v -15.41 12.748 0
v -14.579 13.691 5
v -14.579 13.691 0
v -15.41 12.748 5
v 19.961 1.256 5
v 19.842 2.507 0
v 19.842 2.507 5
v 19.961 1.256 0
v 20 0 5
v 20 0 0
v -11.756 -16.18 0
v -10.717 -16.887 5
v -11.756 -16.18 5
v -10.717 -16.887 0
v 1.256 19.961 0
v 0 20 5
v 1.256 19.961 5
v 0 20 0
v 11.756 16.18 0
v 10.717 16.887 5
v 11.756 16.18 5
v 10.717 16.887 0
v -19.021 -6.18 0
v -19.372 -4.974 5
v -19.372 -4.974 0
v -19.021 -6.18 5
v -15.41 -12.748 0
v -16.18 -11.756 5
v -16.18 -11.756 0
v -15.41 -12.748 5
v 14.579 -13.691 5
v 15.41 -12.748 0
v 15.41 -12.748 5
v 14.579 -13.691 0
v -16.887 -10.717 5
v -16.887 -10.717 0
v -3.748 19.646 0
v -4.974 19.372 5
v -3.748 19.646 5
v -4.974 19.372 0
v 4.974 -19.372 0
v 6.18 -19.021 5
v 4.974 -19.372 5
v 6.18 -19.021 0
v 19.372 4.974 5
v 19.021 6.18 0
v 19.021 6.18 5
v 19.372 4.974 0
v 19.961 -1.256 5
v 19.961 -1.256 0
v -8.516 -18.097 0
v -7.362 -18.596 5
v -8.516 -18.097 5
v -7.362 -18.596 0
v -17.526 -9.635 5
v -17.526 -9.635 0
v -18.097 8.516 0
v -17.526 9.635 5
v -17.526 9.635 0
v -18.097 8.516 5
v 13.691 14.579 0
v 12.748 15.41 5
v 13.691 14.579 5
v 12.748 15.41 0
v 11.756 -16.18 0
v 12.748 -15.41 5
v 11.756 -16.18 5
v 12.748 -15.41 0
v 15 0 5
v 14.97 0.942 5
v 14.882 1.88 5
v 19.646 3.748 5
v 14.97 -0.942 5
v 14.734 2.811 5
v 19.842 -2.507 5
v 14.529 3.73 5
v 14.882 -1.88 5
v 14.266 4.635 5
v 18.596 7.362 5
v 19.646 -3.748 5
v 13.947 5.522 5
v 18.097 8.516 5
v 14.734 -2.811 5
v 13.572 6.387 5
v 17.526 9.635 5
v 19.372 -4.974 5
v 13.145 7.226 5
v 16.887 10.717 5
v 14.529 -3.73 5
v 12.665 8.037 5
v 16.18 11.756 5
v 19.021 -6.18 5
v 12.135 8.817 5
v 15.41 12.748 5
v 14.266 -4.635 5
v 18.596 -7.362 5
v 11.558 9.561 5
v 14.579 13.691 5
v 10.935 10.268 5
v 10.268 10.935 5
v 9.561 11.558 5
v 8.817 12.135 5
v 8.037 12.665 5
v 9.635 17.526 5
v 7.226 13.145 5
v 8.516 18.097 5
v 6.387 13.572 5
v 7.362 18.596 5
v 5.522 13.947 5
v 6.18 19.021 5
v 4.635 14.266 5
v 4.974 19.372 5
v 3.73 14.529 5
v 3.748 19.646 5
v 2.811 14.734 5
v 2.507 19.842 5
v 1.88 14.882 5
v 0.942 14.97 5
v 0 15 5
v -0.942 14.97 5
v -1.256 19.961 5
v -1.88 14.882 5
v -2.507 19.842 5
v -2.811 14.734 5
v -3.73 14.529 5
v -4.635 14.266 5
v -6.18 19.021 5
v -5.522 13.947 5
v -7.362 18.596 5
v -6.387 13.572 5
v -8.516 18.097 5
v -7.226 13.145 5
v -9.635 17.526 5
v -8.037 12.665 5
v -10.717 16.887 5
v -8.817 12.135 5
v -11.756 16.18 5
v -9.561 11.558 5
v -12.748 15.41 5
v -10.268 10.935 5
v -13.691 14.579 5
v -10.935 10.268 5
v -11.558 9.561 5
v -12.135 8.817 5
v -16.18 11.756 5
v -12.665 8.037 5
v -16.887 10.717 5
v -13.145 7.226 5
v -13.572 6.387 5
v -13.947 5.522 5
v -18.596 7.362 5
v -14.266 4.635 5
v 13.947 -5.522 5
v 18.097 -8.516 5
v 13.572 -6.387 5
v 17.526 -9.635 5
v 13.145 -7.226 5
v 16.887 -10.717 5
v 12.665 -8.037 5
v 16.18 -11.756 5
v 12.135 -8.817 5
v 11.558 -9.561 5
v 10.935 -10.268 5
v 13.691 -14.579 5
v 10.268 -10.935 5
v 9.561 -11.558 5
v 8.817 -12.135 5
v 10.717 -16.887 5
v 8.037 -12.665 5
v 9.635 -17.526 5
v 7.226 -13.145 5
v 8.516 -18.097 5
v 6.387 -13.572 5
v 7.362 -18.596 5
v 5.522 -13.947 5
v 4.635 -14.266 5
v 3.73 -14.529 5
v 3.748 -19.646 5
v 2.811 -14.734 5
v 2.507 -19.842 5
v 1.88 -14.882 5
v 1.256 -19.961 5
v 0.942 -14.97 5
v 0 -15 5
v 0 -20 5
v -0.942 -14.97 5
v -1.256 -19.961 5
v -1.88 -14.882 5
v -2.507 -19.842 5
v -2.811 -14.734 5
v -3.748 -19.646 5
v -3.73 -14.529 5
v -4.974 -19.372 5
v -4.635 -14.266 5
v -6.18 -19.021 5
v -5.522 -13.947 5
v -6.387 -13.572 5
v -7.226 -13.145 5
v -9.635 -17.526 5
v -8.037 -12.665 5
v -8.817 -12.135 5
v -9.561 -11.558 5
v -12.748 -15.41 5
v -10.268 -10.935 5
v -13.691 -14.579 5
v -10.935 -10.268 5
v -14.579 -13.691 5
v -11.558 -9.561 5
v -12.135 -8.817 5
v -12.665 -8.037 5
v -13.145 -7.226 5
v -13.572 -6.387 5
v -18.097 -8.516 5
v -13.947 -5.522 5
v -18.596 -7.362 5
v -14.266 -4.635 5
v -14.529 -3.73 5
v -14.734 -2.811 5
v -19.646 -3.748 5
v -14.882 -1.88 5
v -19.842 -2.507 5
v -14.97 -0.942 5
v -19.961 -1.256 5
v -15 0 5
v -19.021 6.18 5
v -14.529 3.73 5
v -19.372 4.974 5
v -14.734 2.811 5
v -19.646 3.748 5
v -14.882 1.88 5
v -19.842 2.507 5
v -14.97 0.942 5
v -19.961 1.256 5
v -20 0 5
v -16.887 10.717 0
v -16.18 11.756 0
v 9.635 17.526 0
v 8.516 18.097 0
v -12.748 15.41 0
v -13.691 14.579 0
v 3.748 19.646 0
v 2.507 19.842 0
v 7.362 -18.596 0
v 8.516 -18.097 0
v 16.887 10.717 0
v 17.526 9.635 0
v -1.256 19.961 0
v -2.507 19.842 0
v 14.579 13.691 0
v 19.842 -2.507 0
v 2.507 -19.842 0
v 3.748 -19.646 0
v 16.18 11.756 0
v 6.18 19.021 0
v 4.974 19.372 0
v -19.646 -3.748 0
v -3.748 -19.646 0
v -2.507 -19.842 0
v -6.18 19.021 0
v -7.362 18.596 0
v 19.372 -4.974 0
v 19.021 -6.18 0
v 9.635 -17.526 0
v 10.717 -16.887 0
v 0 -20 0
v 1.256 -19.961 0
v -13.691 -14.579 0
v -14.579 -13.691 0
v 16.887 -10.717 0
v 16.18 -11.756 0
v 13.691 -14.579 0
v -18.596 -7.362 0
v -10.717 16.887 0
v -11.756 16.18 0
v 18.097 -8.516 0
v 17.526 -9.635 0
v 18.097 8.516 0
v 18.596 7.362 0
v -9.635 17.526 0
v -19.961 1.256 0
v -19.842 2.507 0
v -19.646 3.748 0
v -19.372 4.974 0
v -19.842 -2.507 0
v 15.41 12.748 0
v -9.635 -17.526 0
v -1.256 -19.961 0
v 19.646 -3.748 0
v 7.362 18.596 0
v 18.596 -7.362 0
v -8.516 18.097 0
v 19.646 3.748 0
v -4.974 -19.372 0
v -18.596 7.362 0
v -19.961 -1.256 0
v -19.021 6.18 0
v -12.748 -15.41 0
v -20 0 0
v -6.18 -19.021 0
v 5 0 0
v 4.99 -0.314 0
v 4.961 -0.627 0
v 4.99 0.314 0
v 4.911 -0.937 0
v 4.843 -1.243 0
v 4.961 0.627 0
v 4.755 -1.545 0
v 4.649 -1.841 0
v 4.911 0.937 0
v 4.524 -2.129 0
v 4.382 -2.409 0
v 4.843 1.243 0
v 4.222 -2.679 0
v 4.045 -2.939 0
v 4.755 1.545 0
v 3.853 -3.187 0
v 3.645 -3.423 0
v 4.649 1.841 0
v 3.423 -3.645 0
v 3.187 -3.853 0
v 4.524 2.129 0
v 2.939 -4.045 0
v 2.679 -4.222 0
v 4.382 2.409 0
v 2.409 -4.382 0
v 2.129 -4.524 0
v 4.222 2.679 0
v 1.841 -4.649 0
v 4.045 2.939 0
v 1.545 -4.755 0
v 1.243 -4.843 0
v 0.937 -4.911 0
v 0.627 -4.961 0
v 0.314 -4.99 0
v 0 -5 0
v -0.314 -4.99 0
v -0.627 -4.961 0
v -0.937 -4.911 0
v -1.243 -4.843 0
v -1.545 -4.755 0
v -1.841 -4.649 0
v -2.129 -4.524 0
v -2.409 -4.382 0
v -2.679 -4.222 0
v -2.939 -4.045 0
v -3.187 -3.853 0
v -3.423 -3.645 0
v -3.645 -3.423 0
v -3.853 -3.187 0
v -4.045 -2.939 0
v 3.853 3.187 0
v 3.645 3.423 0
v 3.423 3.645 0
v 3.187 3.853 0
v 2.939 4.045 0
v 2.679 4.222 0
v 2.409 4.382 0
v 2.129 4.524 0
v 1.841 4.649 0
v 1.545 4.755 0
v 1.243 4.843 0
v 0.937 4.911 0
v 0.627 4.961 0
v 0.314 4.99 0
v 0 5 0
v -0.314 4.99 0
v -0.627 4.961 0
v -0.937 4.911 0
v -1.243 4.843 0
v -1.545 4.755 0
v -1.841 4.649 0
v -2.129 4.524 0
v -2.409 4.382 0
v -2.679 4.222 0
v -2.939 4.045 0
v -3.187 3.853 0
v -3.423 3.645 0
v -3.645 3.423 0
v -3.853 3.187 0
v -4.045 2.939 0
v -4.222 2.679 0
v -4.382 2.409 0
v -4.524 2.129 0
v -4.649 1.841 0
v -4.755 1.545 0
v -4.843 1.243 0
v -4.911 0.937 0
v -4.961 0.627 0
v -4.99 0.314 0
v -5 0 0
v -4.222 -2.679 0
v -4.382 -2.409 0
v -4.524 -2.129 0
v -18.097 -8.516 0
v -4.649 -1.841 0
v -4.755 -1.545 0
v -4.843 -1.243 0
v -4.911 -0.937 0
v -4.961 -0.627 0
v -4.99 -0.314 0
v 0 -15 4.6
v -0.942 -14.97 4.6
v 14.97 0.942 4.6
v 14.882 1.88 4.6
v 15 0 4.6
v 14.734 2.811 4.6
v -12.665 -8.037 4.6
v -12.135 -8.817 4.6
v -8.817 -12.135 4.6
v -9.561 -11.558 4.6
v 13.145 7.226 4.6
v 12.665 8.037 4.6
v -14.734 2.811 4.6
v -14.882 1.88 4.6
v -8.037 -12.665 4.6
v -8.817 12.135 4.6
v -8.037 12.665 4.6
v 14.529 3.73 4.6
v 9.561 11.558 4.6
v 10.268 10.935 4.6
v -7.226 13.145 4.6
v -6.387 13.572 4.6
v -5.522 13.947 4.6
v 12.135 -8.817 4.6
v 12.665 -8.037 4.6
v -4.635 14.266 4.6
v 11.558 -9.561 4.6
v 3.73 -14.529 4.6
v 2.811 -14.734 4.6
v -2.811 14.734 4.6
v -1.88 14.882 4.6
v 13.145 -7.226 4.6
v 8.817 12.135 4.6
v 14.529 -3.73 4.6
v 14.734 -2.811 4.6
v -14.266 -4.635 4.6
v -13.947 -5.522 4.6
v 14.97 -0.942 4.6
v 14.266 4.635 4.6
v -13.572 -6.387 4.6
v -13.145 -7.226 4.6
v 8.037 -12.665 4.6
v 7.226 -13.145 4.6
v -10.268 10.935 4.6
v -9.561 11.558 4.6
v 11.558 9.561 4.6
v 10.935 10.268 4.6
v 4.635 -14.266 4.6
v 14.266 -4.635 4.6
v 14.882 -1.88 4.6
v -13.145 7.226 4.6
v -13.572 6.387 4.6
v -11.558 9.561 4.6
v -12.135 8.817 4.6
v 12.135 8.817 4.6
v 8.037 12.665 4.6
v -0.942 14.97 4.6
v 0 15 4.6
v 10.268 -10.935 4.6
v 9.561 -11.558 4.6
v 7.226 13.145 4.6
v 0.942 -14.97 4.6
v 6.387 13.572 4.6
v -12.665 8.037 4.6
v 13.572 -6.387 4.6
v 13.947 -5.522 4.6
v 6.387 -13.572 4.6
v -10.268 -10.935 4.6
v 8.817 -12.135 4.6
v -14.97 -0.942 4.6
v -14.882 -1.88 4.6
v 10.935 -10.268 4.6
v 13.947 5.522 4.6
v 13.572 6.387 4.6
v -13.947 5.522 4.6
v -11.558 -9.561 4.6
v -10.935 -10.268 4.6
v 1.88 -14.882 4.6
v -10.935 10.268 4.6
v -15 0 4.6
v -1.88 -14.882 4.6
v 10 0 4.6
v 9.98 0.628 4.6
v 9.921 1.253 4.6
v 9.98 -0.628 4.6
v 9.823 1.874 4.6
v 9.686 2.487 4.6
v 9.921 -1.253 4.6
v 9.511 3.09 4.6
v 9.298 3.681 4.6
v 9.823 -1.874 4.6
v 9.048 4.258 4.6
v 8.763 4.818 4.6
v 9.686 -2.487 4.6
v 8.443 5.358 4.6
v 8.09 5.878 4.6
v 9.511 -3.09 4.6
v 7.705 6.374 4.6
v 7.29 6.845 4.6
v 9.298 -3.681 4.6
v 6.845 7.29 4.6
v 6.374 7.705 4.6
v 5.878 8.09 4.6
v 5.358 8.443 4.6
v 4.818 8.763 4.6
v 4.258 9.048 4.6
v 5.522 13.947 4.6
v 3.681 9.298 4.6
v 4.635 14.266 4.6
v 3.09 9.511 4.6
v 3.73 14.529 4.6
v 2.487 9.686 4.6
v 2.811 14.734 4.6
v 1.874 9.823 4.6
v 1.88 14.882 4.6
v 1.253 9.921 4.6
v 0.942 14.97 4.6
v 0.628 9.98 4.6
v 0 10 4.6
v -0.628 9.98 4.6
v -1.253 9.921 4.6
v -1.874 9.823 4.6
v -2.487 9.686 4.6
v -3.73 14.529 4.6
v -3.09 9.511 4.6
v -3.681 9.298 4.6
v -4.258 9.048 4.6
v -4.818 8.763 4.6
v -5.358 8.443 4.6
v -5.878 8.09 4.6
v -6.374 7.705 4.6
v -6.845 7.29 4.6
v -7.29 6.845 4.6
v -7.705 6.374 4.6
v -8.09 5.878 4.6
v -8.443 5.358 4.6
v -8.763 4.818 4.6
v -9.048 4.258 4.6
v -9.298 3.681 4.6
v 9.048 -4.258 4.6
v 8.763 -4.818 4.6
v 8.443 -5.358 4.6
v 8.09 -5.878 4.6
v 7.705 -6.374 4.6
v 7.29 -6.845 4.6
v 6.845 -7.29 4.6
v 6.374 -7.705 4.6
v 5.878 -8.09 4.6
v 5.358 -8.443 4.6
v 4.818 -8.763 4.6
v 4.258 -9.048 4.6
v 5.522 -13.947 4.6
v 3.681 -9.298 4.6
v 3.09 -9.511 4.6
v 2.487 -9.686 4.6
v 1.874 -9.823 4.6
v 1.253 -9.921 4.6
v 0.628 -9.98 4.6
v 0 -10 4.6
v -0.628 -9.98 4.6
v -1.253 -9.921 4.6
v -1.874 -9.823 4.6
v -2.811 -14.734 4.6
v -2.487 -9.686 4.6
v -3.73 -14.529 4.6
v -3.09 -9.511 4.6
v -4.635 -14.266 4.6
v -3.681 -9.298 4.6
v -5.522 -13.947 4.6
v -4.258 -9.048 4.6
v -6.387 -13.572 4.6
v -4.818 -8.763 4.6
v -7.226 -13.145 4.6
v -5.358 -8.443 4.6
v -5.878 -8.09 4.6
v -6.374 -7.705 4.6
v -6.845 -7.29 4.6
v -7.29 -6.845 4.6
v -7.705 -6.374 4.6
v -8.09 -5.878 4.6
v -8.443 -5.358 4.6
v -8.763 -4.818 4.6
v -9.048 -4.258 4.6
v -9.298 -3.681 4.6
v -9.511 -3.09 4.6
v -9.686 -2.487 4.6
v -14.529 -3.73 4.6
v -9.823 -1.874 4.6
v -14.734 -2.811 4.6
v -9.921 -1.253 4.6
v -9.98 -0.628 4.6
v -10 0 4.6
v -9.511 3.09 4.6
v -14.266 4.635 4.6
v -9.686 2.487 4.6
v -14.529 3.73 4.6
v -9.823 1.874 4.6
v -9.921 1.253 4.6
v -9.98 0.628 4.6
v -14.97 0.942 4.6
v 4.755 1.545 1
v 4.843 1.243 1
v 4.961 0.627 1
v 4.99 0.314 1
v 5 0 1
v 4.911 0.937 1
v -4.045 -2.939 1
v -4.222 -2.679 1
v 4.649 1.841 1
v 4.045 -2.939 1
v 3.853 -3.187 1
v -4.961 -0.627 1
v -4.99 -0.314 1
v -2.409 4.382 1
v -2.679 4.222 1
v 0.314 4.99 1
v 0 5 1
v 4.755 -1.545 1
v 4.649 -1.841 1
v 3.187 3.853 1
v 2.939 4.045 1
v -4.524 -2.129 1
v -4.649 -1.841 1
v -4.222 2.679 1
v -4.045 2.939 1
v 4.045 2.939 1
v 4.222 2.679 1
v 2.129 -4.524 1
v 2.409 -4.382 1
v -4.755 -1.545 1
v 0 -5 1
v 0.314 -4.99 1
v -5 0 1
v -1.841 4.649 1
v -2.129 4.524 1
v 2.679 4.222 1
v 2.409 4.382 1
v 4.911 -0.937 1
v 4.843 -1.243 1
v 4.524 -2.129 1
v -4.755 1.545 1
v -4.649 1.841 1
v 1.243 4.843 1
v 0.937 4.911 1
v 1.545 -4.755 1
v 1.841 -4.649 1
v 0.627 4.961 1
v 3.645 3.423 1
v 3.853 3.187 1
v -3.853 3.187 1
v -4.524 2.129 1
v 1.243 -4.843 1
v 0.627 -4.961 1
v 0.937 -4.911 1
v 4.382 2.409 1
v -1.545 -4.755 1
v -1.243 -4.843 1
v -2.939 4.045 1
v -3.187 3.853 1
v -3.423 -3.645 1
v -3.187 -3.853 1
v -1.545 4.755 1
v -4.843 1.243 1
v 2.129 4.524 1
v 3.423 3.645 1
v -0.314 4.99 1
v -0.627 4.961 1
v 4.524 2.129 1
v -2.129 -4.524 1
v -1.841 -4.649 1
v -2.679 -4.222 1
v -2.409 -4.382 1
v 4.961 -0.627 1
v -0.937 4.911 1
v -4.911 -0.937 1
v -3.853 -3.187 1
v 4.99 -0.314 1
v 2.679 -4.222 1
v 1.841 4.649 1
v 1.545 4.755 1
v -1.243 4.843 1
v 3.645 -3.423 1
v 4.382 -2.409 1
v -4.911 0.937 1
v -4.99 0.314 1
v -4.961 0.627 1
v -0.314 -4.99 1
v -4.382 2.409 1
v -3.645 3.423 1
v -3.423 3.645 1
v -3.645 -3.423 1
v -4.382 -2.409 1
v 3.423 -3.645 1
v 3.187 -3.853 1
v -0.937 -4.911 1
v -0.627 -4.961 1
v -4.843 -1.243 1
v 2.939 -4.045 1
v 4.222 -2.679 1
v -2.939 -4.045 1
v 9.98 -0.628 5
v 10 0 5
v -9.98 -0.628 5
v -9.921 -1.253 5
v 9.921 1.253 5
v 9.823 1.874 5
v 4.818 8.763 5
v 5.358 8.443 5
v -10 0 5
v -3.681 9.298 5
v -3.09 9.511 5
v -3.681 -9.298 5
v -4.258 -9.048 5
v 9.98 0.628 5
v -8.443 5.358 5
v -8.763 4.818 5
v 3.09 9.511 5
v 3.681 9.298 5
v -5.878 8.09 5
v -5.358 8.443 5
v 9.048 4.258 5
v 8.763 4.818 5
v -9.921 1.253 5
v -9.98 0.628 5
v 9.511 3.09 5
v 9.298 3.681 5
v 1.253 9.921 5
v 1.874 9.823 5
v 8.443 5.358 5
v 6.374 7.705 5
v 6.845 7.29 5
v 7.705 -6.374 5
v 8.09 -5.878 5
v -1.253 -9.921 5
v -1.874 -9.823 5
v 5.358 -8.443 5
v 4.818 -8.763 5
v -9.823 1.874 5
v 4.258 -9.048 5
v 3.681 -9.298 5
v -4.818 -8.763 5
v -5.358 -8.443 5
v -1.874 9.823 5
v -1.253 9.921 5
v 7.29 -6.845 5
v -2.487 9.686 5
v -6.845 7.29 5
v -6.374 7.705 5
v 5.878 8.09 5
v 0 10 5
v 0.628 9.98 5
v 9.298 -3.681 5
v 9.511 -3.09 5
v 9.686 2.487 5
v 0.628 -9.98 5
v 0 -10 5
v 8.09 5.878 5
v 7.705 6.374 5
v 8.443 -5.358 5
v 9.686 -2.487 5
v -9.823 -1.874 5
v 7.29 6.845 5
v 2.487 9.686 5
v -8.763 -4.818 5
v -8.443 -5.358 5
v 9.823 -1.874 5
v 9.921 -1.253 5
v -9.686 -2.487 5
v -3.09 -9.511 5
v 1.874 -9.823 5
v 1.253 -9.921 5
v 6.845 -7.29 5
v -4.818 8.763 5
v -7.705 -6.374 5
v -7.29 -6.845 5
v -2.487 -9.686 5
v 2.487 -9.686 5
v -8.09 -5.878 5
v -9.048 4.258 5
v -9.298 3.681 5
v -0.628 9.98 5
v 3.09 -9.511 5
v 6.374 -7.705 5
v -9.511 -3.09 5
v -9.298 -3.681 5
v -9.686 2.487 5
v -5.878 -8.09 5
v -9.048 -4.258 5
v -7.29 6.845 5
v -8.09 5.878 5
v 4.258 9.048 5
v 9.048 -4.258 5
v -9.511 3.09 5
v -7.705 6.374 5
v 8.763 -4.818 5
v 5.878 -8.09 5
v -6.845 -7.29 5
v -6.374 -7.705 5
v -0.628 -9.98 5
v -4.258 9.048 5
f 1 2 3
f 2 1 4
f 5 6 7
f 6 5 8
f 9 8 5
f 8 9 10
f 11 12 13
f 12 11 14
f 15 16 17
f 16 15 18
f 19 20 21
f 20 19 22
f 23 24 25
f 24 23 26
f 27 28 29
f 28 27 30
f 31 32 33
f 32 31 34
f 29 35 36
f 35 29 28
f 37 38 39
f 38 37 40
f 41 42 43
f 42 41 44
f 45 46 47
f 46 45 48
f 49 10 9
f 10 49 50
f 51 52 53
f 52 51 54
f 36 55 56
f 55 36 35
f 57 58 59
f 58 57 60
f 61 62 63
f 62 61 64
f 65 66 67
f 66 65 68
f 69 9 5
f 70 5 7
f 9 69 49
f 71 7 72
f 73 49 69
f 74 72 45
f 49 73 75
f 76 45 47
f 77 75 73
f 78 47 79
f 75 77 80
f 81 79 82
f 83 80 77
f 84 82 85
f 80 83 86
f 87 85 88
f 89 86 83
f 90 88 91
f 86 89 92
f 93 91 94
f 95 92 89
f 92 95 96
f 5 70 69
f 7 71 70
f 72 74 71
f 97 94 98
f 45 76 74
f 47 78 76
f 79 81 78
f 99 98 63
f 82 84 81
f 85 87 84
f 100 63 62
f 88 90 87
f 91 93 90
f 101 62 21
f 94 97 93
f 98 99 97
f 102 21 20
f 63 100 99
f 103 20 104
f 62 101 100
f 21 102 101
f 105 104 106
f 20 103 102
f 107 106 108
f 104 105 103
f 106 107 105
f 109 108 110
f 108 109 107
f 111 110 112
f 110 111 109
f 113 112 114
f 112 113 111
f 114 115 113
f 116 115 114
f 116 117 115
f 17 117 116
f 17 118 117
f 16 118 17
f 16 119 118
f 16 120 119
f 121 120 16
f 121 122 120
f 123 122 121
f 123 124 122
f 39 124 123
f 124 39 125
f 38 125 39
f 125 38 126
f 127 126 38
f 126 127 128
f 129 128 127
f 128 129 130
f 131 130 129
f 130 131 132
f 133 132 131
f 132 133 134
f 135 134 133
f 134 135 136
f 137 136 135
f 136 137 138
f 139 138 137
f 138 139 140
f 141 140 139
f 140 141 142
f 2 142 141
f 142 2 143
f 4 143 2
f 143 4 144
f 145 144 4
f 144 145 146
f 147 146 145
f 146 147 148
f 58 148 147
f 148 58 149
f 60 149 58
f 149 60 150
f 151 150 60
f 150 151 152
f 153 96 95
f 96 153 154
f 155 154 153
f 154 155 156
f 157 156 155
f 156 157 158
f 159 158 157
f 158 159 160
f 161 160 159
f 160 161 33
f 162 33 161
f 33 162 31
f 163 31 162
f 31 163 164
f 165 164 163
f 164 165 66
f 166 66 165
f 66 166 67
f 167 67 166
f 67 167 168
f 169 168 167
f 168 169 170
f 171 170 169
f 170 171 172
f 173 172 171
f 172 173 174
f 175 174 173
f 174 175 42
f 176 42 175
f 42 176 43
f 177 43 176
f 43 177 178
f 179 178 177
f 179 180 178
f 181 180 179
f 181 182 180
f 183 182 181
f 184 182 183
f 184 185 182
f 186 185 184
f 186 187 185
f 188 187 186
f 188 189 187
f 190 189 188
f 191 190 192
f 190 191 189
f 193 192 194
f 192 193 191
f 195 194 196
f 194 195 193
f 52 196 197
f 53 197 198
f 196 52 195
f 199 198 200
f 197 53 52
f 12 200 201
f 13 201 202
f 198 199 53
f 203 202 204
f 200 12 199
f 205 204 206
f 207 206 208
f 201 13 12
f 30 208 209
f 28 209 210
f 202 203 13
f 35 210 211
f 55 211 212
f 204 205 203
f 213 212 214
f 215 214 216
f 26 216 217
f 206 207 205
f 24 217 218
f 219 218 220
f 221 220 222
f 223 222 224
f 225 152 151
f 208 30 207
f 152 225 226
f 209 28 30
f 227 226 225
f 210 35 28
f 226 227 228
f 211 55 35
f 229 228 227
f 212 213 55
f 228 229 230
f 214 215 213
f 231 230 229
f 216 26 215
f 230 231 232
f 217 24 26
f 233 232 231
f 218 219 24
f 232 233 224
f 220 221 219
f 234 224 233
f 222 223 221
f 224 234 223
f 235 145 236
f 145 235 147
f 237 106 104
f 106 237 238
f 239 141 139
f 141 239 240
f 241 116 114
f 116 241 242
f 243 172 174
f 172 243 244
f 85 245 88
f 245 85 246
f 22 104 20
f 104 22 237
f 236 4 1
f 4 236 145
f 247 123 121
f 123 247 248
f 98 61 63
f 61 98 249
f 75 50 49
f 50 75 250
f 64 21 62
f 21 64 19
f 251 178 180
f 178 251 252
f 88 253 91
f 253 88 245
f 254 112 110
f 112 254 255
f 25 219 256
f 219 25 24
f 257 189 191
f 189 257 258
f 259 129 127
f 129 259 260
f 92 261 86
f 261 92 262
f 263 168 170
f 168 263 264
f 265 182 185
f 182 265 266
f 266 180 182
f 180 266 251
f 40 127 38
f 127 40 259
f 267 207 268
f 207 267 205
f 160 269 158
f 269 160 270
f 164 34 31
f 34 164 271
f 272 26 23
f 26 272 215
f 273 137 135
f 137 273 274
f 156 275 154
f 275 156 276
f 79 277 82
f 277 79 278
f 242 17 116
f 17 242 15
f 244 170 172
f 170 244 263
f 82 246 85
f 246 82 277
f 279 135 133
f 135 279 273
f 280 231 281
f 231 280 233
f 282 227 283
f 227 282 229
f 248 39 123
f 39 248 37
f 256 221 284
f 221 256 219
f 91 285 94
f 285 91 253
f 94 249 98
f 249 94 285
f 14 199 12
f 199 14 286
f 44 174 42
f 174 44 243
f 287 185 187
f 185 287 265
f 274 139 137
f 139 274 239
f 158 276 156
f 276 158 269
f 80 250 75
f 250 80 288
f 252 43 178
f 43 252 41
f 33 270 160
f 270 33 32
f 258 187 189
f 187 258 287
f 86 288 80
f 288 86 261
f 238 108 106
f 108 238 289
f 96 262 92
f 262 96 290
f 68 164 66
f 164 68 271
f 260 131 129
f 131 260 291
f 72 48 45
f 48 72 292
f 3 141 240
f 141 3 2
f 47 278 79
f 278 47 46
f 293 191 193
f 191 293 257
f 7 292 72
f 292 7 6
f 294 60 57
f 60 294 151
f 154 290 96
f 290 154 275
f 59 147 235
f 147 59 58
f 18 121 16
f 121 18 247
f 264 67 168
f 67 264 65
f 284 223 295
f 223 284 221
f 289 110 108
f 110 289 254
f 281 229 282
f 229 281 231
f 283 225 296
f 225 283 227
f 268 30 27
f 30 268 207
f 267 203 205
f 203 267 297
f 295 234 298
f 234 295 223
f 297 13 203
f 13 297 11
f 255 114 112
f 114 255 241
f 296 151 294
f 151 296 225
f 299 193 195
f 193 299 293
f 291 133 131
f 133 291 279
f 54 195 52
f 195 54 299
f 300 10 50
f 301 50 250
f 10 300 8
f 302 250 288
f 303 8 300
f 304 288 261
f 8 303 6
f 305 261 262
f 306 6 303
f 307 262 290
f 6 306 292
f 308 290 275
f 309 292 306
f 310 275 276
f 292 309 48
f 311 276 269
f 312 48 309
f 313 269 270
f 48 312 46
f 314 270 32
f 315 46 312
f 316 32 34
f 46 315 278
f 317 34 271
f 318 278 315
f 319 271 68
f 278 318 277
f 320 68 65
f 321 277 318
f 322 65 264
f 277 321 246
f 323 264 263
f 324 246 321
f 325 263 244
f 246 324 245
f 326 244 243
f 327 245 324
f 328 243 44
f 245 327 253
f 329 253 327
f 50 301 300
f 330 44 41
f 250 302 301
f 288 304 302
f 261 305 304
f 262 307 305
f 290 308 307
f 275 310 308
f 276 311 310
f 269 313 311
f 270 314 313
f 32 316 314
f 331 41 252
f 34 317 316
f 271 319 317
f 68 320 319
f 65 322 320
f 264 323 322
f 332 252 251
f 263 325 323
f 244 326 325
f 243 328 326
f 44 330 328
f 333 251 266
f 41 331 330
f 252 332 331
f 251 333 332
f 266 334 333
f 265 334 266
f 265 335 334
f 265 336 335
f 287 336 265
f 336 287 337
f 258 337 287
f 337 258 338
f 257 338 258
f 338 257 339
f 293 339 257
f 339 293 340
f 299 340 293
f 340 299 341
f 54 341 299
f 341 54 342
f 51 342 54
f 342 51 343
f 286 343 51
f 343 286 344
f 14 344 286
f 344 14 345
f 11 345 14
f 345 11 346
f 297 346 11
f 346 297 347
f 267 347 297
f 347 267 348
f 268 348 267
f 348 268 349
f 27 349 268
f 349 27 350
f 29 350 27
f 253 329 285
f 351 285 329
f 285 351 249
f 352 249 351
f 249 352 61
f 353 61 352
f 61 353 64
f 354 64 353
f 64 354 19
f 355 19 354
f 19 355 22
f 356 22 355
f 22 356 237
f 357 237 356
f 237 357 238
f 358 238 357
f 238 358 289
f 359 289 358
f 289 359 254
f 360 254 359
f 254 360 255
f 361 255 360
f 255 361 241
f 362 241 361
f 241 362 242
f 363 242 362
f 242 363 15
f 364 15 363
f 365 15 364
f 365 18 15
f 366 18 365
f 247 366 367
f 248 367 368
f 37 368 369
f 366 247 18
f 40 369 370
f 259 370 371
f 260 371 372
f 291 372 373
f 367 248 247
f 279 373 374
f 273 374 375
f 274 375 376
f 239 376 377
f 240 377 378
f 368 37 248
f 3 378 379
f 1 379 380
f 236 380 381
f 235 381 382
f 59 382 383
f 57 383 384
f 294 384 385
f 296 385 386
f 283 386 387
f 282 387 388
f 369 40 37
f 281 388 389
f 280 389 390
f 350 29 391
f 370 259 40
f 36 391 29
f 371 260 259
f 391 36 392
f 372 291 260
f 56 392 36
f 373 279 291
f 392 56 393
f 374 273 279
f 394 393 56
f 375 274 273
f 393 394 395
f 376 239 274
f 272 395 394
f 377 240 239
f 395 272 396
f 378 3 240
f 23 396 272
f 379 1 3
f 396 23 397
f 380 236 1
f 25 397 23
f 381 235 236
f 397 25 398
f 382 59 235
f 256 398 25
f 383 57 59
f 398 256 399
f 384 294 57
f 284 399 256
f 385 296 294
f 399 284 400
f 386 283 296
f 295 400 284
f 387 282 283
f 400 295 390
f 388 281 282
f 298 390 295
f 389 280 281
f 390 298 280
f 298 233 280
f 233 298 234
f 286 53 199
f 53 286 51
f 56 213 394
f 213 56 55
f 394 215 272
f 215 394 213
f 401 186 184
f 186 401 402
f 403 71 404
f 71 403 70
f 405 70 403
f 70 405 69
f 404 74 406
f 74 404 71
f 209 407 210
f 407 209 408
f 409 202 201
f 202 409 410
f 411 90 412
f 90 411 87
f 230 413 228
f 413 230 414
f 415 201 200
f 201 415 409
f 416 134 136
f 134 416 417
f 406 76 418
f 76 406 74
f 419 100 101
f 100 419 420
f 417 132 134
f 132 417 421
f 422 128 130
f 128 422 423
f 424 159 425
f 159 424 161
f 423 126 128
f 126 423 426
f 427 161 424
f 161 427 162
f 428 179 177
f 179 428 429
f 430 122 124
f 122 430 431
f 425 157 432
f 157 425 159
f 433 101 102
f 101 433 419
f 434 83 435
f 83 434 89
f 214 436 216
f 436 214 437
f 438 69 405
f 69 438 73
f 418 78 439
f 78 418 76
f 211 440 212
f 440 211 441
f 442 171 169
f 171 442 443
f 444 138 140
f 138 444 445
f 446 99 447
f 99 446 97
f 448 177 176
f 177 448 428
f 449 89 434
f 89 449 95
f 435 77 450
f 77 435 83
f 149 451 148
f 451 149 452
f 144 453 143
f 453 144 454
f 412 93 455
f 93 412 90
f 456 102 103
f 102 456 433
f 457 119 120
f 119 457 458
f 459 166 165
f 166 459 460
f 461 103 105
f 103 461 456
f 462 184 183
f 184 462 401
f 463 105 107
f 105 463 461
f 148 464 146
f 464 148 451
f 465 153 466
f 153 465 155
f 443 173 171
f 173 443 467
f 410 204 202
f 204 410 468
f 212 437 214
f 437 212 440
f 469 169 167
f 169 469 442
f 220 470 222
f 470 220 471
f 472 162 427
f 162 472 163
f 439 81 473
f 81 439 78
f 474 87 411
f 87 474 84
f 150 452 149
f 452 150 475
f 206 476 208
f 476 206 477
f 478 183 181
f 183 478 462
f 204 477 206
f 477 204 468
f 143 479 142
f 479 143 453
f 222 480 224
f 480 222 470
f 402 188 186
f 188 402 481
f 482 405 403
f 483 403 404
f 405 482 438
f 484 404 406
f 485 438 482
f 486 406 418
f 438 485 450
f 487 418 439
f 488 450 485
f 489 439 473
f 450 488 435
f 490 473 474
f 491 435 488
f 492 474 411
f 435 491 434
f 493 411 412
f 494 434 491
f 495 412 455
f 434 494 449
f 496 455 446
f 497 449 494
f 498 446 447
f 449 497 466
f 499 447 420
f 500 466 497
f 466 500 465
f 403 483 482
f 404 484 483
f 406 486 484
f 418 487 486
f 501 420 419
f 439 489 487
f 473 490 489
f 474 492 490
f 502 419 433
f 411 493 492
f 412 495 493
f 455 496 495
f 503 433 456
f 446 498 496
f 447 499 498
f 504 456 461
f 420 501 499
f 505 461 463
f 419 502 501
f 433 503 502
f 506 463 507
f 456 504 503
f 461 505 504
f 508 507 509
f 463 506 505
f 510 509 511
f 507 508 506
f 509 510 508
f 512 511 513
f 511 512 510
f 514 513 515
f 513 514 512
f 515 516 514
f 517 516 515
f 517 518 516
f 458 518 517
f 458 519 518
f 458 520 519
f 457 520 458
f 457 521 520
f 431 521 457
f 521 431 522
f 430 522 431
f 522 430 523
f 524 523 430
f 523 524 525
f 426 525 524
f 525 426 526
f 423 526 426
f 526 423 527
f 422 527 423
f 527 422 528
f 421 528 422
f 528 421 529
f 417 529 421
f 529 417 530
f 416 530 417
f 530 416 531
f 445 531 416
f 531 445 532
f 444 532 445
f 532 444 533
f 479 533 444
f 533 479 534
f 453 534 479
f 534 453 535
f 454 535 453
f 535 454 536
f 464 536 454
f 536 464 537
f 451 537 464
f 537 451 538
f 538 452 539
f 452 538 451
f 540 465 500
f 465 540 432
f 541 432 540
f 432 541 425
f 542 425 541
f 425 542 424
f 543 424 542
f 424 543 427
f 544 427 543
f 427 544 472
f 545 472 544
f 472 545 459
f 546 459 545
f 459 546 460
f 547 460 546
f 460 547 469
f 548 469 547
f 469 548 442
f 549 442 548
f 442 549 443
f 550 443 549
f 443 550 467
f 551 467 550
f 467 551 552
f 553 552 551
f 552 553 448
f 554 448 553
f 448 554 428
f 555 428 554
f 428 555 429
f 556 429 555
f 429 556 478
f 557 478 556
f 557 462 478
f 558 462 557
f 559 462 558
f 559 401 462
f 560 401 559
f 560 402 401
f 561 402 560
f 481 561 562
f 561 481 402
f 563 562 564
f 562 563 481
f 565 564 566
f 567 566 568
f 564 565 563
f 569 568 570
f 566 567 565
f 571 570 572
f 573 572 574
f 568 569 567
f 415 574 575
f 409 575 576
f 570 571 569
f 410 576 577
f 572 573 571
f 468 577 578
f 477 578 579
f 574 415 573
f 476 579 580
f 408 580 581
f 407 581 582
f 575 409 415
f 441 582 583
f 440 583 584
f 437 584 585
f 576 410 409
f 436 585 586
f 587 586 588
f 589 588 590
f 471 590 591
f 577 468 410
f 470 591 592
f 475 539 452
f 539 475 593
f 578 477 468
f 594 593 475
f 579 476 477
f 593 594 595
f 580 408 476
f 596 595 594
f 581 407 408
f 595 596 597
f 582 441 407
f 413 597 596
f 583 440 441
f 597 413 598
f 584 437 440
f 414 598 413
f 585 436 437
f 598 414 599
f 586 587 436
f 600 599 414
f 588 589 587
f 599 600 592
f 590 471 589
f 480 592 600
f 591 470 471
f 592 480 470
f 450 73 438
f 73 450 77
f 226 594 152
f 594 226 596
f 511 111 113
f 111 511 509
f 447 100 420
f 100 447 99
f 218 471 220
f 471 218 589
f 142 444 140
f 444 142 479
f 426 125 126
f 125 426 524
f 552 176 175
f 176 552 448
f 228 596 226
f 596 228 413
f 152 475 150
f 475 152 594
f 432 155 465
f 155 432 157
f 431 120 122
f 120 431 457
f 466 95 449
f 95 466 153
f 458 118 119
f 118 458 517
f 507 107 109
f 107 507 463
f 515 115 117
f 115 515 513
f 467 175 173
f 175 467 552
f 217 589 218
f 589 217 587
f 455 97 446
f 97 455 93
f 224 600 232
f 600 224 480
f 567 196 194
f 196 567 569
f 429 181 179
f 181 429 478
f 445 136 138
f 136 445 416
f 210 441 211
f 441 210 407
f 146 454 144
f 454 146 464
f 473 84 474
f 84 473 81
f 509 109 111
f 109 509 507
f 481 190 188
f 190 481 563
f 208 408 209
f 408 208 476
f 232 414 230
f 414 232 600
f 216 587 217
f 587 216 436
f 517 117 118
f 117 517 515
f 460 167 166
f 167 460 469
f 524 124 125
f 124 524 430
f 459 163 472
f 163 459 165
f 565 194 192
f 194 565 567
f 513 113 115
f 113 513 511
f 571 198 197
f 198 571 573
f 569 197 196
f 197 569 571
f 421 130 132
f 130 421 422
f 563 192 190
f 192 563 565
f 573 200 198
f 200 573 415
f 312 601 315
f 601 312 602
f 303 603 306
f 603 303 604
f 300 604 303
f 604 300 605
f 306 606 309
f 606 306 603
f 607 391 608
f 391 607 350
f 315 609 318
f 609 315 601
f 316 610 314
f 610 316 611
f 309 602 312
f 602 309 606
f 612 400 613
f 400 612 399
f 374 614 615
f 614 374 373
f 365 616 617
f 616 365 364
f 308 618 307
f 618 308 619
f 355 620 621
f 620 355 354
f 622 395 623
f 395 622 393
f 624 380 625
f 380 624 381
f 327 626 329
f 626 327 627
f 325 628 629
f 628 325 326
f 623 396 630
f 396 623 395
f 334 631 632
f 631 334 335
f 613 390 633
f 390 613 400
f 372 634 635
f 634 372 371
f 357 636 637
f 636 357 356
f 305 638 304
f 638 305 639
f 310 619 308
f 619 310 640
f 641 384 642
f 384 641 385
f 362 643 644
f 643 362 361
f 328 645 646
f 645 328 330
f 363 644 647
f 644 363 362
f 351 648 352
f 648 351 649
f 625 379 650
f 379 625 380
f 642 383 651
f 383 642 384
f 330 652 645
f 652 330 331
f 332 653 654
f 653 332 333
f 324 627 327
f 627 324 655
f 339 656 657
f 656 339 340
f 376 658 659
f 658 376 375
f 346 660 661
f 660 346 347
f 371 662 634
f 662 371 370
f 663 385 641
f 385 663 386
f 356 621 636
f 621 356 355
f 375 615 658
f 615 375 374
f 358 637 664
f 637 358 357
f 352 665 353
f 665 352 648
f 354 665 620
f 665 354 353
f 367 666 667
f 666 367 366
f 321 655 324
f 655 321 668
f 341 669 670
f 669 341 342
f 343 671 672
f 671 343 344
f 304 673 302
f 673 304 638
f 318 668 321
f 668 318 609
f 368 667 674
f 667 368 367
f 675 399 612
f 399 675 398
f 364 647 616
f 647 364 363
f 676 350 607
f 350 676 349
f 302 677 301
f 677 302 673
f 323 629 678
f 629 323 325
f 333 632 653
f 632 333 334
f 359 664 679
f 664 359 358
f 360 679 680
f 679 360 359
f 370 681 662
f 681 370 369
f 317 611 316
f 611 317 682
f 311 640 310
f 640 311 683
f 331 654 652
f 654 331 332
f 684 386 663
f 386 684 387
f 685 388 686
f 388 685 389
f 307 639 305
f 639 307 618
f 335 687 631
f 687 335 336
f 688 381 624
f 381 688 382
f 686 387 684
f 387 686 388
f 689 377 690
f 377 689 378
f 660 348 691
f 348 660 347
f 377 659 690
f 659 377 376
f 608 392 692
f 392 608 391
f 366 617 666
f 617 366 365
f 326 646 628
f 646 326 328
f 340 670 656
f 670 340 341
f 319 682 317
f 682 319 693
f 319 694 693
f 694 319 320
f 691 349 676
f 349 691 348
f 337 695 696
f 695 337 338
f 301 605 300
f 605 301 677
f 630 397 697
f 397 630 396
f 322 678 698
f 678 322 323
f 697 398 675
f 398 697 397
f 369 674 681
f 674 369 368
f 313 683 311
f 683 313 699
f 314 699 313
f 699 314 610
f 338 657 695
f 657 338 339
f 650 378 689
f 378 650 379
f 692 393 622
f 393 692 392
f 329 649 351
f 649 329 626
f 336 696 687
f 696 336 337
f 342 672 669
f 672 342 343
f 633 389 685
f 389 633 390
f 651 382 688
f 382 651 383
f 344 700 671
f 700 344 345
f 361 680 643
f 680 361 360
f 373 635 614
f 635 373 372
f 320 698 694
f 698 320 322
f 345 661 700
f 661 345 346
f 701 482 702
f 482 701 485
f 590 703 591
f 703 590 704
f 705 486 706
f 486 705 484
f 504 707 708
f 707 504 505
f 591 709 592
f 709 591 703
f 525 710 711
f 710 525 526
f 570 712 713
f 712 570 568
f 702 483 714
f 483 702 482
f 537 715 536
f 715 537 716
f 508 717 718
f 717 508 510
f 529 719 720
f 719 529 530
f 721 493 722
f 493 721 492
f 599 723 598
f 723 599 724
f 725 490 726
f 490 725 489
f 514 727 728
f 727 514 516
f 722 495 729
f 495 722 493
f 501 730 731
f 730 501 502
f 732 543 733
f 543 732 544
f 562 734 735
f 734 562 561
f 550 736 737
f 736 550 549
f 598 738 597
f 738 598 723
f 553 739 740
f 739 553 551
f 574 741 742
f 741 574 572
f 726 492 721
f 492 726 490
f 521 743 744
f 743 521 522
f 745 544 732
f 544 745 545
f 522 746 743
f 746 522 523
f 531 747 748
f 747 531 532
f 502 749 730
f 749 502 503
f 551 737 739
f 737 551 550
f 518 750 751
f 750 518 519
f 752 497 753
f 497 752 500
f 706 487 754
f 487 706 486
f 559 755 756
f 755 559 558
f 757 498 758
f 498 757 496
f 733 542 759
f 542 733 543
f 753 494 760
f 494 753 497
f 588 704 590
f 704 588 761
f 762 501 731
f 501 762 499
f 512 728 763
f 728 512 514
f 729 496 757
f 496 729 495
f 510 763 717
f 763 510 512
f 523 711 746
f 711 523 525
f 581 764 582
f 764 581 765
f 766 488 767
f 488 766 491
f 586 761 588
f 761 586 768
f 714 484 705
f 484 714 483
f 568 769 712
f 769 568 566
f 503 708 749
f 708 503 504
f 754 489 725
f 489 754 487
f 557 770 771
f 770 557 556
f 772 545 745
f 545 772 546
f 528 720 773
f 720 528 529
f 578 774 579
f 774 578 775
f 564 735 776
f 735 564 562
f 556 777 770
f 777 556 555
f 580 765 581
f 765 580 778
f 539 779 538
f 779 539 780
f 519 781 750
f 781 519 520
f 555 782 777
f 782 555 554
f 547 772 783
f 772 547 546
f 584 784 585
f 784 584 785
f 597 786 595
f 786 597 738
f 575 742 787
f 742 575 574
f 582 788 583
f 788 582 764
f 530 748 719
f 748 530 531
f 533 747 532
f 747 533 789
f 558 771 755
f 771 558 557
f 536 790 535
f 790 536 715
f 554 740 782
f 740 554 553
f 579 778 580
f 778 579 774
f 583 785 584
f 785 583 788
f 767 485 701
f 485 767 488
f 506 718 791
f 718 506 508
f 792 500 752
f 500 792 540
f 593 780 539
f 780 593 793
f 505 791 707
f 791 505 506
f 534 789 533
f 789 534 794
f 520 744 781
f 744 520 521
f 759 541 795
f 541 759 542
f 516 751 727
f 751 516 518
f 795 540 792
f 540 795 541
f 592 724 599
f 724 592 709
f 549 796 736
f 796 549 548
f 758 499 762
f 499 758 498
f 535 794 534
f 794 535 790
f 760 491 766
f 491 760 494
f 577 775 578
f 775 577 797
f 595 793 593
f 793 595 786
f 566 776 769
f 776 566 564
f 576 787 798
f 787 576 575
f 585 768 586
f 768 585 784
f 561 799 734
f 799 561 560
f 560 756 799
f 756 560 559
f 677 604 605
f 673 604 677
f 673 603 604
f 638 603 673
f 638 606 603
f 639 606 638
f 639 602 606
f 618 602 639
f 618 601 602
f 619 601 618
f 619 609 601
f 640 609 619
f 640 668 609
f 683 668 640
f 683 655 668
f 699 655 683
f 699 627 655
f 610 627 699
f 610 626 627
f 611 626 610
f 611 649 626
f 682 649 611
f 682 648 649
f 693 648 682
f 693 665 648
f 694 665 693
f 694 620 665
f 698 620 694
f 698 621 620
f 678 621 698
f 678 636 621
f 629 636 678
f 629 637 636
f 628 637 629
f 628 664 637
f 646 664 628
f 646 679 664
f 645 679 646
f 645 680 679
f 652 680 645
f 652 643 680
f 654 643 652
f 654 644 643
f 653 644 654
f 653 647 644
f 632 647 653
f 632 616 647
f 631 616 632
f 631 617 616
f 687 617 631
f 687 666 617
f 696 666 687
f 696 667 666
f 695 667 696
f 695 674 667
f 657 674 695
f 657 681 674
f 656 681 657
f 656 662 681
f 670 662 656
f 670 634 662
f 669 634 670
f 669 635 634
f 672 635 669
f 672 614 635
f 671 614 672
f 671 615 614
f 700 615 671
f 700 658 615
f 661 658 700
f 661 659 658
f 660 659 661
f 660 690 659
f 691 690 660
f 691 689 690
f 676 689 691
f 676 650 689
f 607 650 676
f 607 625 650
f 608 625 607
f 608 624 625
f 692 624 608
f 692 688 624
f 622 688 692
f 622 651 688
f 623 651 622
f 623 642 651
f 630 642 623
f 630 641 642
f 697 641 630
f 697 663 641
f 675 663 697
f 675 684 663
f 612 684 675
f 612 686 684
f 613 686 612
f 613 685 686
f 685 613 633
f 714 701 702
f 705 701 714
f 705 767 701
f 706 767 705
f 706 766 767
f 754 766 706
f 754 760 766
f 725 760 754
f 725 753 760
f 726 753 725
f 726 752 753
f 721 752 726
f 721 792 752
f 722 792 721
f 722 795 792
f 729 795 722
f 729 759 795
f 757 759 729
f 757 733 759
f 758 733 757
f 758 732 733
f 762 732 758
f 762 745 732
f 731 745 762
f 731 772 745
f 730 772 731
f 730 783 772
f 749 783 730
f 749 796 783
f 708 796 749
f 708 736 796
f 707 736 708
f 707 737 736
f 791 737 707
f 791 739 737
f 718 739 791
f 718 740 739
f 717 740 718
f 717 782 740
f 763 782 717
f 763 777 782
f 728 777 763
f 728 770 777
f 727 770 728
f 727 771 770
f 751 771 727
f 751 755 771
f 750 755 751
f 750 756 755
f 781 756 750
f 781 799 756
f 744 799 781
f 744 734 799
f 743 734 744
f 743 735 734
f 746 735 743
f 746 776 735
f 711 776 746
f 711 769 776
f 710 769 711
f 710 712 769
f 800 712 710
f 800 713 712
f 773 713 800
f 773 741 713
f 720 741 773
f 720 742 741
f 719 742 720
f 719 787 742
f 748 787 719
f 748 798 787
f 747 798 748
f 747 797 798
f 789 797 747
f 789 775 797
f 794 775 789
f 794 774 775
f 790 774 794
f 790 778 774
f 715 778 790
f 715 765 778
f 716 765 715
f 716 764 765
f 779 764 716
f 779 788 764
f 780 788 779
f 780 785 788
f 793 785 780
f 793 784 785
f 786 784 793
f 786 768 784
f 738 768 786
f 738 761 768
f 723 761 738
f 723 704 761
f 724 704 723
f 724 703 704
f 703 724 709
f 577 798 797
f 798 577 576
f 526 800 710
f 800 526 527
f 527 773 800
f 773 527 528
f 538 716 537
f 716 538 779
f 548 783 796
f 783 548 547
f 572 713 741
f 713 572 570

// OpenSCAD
$fn=100;
color ([1,1,1]) {
difference () {
cylinder (5,20,20);
translate([0,0,4.6]) cylinder (2,15,15);
translate ([0,0,-0.1])cylinder (1.97,5,5);
}
translate ([0,0,1])cylinder (4,10,10);
}
